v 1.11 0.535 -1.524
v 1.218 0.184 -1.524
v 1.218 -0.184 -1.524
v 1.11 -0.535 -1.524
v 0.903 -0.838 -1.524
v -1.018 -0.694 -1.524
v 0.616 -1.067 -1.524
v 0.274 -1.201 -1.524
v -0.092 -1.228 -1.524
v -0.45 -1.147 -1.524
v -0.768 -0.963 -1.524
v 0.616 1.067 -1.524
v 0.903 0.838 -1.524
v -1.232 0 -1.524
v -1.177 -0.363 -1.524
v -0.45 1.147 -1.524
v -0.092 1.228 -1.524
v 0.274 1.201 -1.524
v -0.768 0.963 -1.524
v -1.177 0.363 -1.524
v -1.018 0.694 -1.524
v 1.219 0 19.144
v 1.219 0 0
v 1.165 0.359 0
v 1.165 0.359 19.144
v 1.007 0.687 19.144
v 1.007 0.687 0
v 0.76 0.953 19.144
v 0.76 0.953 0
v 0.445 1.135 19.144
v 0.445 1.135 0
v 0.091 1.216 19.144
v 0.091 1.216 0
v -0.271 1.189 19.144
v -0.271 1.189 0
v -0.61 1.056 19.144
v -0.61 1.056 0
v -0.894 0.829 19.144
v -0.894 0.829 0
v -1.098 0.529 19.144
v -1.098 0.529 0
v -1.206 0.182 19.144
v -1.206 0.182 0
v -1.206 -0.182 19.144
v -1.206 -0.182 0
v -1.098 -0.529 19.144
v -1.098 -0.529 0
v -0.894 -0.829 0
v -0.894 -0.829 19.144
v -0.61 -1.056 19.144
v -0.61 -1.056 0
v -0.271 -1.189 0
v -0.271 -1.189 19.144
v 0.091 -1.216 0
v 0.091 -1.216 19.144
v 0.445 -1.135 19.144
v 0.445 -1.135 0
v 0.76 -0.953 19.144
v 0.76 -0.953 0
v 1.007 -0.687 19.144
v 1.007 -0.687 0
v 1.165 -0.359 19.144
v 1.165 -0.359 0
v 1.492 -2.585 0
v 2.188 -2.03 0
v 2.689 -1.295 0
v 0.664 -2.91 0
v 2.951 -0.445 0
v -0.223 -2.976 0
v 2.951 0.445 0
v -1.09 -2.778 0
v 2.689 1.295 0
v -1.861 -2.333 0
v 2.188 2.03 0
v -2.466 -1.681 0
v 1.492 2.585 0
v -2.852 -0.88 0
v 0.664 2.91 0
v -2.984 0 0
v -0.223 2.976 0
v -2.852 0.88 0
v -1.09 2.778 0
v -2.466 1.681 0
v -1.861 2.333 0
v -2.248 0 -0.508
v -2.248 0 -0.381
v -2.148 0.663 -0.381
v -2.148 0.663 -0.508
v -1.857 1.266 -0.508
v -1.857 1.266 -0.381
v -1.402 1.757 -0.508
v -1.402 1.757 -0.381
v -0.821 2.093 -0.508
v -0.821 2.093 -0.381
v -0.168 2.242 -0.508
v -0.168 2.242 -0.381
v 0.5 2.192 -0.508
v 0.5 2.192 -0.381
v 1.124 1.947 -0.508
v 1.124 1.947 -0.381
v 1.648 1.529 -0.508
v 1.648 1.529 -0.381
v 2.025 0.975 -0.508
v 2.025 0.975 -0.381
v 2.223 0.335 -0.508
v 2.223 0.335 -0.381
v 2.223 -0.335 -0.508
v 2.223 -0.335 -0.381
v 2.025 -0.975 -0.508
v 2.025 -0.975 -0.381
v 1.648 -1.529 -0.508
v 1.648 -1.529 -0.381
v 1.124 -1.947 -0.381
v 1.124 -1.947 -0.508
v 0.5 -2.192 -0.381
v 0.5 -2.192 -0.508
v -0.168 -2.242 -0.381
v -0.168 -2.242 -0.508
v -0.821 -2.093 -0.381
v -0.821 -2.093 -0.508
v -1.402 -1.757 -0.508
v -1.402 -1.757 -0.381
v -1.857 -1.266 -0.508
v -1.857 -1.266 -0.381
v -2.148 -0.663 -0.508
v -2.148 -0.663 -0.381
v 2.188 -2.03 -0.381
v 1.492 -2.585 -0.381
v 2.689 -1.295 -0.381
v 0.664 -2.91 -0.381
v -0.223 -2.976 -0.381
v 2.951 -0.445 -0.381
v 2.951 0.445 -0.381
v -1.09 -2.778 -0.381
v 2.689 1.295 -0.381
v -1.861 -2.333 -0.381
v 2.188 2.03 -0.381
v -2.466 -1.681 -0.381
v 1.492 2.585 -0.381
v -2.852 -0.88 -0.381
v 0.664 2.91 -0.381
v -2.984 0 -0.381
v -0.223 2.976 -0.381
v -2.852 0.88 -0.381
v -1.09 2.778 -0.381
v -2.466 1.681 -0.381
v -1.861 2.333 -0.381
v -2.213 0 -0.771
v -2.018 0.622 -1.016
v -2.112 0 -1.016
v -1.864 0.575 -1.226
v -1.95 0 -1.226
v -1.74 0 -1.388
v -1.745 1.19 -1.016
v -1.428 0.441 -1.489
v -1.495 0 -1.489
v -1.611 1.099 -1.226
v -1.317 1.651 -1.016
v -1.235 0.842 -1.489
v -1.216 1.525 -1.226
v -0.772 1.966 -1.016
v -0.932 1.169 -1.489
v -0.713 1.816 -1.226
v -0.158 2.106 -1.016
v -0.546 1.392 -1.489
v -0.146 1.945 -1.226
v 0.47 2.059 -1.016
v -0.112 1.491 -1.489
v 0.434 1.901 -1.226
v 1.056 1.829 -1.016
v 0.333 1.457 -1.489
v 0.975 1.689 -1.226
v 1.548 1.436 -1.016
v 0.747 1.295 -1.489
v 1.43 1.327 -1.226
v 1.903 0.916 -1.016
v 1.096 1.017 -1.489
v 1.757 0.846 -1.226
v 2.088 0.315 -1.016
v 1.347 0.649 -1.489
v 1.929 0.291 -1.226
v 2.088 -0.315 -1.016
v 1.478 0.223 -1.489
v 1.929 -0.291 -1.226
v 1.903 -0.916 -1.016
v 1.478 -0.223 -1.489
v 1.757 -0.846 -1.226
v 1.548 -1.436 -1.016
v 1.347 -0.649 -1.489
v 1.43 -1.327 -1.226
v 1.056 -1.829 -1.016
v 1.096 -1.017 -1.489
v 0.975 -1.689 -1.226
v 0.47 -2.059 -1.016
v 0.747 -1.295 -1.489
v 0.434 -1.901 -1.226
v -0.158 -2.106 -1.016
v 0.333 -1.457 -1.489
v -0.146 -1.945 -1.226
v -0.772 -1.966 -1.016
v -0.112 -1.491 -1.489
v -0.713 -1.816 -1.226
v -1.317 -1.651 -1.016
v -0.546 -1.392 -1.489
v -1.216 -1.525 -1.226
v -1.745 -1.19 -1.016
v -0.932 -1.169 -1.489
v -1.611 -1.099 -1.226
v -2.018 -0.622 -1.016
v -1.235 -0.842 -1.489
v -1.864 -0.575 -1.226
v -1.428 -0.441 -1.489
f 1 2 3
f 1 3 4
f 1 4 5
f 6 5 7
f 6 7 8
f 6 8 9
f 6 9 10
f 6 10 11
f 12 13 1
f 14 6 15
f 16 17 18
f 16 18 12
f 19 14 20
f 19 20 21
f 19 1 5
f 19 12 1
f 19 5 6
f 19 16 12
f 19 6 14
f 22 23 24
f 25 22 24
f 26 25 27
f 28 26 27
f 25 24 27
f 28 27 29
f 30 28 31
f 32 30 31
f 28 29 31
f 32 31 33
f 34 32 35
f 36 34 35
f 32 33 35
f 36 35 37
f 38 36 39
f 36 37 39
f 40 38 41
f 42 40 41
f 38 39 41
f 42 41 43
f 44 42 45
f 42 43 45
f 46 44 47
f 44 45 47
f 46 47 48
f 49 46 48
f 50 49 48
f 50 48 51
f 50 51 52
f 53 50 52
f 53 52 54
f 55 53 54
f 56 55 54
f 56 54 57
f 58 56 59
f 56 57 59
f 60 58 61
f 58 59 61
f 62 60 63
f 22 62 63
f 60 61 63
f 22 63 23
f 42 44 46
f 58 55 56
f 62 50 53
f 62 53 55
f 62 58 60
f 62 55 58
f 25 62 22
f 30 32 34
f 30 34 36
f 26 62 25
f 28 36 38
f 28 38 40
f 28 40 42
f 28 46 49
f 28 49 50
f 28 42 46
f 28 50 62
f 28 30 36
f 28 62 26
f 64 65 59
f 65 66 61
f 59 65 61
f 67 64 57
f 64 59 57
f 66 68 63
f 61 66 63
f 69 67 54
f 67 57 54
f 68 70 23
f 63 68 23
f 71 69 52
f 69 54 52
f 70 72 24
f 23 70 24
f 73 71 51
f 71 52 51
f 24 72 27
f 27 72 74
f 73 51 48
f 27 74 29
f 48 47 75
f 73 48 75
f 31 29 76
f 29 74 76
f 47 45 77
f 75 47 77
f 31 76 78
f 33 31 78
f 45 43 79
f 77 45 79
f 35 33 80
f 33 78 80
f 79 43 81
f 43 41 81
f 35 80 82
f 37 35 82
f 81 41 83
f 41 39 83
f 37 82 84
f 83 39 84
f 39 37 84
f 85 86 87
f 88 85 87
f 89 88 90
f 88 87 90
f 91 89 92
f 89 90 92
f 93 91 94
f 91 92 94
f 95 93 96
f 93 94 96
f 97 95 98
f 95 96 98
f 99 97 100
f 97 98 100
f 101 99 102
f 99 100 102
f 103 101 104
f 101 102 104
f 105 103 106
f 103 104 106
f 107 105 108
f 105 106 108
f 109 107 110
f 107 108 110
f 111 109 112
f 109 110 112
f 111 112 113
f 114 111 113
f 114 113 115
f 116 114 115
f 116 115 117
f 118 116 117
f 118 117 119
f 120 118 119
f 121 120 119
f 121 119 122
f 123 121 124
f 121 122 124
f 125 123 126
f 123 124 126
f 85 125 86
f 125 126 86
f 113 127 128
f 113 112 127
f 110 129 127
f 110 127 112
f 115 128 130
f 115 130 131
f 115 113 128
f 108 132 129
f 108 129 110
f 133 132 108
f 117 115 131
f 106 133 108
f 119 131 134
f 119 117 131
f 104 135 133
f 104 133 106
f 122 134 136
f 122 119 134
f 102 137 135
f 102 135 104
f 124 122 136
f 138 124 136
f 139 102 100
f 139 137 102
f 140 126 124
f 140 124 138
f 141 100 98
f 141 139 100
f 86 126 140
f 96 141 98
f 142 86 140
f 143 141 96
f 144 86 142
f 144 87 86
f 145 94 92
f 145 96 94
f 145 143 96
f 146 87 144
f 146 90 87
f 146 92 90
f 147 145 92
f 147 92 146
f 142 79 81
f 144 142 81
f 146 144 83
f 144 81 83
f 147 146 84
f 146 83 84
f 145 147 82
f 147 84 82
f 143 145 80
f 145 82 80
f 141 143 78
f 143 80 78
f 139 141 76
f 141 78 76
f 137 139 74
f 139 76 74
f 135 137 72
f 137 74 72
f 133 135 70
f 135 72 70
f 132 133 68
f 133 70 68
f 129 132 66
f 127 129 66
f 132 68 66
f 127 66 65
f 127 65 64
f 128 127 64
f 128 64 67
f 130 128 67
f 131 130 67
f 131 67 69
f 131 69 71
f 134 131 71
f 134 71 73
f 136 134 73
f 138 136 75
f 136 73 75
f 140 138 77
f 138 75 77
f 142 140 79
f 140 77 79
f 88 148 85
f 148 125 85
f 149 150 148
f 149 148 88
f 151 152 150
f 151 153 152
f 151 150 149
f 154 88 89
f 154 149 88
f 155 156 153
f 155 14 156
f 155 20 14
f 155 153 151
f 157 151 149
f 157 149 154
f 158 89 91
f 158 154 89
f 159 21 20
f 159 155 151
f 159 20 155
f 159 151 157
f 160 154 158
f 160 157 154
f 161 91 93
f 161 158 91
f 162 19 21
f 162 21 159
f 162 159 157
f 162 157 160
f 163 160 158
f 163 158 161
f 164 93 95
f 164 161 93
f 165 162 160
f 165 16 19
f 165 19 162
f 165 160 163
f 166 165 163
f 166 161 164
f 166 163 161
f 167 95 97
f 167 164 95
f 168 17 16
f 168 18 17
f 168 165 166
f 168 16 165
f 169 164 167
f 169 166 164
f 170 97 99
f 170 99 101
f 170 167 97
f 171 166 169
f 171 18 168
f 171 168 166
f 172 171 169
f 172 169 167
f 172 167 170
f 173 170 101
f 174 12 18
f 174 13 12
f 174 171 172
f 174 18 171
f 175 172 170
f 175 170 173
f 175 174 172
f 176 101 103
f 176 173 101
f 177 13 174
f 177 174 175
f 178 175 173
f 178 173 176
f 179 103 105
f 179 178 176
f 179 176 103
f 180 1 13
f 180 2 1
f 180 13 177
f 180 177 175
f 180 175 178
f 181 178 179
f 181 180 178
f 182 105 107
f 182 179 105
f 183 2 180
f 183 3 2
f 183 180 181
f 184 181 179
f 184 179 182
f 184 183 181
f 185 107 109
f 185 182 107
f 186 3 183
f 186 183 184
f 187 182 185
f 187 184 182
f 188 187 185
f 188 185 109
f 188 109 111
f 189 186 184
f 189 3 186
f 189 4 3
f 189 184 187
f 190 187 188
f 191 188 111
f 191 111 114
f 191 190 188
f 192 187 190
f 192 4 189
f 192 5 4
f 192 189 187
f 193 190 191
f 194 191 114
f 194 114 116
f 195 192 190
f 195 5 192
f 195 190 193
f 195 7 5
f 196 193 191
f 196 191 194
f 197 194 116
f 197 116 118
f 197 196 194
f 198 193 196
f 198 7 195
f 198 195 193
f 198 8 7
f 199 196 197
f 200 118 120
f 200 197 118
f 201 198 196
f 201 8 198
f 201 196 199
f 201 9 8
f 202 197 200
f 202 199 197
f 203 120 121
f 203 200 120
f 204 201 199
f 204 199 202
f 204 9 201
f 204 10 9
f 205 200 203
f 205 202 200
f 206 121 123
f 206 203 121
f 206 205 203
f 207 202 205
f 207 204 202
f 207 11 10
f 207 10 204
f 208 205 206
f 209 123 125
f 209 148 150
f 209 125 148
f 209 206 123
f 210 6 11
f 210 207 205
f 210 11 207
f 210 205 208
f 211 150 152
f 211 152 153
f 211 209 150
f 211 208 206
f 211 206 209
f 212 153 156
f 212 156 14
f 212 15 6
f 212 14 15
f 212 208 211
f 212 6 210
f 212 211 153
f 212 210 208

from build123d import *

# Parameters (mm, degrees)
SKETCH1_R      = 1.2192
EXTRUDE1_DEPTH = 19.144
SKETCH2_R      = 2.9845
EXTRUDE2_DEPTH = 0.381
SKETCH3_R      = 2.2479
EXTRUDE3_DEPTH = 1.143
FILLET1_R      = 1.016


with BuildPart() as part:
    # Sketch1 → Extrude1 (new body)
    with BuildSketch(Plane.XY):
        Circle(SKETCH1_R)
    extrude(amount=EXTRUDE1_DEPTH)

    # Sketch2 → Extrude2 (add)
    with BuildSketch(Plane(origin=(0, 0, 0), x_dir=(-1, 0, 0), z_dir=(0, 0, -1))):
        Circle(SKETCH2_R)
    extrude(amount=EXTRUDE2_DEPTH)

    # Sketch3 → Extrude3 (add)
    with BuildSketch(Plane(origin=(0, 0, -0.381), x_dir=(-1, 0, 0), z_dir=(0, 0, -1))):
        Circle(SKETCH3_R)
    extrude(amount=EXTRUDE3_DEPTH)

    # Fillet1
    fillet1_edges = [part.edges().sort_by_distance(p)[0] for p in [
        (2.2479, 0, -1.524),
    ]]
    fillet(fillet1_edges, radius=FILLET1_R)


solid = part.part
